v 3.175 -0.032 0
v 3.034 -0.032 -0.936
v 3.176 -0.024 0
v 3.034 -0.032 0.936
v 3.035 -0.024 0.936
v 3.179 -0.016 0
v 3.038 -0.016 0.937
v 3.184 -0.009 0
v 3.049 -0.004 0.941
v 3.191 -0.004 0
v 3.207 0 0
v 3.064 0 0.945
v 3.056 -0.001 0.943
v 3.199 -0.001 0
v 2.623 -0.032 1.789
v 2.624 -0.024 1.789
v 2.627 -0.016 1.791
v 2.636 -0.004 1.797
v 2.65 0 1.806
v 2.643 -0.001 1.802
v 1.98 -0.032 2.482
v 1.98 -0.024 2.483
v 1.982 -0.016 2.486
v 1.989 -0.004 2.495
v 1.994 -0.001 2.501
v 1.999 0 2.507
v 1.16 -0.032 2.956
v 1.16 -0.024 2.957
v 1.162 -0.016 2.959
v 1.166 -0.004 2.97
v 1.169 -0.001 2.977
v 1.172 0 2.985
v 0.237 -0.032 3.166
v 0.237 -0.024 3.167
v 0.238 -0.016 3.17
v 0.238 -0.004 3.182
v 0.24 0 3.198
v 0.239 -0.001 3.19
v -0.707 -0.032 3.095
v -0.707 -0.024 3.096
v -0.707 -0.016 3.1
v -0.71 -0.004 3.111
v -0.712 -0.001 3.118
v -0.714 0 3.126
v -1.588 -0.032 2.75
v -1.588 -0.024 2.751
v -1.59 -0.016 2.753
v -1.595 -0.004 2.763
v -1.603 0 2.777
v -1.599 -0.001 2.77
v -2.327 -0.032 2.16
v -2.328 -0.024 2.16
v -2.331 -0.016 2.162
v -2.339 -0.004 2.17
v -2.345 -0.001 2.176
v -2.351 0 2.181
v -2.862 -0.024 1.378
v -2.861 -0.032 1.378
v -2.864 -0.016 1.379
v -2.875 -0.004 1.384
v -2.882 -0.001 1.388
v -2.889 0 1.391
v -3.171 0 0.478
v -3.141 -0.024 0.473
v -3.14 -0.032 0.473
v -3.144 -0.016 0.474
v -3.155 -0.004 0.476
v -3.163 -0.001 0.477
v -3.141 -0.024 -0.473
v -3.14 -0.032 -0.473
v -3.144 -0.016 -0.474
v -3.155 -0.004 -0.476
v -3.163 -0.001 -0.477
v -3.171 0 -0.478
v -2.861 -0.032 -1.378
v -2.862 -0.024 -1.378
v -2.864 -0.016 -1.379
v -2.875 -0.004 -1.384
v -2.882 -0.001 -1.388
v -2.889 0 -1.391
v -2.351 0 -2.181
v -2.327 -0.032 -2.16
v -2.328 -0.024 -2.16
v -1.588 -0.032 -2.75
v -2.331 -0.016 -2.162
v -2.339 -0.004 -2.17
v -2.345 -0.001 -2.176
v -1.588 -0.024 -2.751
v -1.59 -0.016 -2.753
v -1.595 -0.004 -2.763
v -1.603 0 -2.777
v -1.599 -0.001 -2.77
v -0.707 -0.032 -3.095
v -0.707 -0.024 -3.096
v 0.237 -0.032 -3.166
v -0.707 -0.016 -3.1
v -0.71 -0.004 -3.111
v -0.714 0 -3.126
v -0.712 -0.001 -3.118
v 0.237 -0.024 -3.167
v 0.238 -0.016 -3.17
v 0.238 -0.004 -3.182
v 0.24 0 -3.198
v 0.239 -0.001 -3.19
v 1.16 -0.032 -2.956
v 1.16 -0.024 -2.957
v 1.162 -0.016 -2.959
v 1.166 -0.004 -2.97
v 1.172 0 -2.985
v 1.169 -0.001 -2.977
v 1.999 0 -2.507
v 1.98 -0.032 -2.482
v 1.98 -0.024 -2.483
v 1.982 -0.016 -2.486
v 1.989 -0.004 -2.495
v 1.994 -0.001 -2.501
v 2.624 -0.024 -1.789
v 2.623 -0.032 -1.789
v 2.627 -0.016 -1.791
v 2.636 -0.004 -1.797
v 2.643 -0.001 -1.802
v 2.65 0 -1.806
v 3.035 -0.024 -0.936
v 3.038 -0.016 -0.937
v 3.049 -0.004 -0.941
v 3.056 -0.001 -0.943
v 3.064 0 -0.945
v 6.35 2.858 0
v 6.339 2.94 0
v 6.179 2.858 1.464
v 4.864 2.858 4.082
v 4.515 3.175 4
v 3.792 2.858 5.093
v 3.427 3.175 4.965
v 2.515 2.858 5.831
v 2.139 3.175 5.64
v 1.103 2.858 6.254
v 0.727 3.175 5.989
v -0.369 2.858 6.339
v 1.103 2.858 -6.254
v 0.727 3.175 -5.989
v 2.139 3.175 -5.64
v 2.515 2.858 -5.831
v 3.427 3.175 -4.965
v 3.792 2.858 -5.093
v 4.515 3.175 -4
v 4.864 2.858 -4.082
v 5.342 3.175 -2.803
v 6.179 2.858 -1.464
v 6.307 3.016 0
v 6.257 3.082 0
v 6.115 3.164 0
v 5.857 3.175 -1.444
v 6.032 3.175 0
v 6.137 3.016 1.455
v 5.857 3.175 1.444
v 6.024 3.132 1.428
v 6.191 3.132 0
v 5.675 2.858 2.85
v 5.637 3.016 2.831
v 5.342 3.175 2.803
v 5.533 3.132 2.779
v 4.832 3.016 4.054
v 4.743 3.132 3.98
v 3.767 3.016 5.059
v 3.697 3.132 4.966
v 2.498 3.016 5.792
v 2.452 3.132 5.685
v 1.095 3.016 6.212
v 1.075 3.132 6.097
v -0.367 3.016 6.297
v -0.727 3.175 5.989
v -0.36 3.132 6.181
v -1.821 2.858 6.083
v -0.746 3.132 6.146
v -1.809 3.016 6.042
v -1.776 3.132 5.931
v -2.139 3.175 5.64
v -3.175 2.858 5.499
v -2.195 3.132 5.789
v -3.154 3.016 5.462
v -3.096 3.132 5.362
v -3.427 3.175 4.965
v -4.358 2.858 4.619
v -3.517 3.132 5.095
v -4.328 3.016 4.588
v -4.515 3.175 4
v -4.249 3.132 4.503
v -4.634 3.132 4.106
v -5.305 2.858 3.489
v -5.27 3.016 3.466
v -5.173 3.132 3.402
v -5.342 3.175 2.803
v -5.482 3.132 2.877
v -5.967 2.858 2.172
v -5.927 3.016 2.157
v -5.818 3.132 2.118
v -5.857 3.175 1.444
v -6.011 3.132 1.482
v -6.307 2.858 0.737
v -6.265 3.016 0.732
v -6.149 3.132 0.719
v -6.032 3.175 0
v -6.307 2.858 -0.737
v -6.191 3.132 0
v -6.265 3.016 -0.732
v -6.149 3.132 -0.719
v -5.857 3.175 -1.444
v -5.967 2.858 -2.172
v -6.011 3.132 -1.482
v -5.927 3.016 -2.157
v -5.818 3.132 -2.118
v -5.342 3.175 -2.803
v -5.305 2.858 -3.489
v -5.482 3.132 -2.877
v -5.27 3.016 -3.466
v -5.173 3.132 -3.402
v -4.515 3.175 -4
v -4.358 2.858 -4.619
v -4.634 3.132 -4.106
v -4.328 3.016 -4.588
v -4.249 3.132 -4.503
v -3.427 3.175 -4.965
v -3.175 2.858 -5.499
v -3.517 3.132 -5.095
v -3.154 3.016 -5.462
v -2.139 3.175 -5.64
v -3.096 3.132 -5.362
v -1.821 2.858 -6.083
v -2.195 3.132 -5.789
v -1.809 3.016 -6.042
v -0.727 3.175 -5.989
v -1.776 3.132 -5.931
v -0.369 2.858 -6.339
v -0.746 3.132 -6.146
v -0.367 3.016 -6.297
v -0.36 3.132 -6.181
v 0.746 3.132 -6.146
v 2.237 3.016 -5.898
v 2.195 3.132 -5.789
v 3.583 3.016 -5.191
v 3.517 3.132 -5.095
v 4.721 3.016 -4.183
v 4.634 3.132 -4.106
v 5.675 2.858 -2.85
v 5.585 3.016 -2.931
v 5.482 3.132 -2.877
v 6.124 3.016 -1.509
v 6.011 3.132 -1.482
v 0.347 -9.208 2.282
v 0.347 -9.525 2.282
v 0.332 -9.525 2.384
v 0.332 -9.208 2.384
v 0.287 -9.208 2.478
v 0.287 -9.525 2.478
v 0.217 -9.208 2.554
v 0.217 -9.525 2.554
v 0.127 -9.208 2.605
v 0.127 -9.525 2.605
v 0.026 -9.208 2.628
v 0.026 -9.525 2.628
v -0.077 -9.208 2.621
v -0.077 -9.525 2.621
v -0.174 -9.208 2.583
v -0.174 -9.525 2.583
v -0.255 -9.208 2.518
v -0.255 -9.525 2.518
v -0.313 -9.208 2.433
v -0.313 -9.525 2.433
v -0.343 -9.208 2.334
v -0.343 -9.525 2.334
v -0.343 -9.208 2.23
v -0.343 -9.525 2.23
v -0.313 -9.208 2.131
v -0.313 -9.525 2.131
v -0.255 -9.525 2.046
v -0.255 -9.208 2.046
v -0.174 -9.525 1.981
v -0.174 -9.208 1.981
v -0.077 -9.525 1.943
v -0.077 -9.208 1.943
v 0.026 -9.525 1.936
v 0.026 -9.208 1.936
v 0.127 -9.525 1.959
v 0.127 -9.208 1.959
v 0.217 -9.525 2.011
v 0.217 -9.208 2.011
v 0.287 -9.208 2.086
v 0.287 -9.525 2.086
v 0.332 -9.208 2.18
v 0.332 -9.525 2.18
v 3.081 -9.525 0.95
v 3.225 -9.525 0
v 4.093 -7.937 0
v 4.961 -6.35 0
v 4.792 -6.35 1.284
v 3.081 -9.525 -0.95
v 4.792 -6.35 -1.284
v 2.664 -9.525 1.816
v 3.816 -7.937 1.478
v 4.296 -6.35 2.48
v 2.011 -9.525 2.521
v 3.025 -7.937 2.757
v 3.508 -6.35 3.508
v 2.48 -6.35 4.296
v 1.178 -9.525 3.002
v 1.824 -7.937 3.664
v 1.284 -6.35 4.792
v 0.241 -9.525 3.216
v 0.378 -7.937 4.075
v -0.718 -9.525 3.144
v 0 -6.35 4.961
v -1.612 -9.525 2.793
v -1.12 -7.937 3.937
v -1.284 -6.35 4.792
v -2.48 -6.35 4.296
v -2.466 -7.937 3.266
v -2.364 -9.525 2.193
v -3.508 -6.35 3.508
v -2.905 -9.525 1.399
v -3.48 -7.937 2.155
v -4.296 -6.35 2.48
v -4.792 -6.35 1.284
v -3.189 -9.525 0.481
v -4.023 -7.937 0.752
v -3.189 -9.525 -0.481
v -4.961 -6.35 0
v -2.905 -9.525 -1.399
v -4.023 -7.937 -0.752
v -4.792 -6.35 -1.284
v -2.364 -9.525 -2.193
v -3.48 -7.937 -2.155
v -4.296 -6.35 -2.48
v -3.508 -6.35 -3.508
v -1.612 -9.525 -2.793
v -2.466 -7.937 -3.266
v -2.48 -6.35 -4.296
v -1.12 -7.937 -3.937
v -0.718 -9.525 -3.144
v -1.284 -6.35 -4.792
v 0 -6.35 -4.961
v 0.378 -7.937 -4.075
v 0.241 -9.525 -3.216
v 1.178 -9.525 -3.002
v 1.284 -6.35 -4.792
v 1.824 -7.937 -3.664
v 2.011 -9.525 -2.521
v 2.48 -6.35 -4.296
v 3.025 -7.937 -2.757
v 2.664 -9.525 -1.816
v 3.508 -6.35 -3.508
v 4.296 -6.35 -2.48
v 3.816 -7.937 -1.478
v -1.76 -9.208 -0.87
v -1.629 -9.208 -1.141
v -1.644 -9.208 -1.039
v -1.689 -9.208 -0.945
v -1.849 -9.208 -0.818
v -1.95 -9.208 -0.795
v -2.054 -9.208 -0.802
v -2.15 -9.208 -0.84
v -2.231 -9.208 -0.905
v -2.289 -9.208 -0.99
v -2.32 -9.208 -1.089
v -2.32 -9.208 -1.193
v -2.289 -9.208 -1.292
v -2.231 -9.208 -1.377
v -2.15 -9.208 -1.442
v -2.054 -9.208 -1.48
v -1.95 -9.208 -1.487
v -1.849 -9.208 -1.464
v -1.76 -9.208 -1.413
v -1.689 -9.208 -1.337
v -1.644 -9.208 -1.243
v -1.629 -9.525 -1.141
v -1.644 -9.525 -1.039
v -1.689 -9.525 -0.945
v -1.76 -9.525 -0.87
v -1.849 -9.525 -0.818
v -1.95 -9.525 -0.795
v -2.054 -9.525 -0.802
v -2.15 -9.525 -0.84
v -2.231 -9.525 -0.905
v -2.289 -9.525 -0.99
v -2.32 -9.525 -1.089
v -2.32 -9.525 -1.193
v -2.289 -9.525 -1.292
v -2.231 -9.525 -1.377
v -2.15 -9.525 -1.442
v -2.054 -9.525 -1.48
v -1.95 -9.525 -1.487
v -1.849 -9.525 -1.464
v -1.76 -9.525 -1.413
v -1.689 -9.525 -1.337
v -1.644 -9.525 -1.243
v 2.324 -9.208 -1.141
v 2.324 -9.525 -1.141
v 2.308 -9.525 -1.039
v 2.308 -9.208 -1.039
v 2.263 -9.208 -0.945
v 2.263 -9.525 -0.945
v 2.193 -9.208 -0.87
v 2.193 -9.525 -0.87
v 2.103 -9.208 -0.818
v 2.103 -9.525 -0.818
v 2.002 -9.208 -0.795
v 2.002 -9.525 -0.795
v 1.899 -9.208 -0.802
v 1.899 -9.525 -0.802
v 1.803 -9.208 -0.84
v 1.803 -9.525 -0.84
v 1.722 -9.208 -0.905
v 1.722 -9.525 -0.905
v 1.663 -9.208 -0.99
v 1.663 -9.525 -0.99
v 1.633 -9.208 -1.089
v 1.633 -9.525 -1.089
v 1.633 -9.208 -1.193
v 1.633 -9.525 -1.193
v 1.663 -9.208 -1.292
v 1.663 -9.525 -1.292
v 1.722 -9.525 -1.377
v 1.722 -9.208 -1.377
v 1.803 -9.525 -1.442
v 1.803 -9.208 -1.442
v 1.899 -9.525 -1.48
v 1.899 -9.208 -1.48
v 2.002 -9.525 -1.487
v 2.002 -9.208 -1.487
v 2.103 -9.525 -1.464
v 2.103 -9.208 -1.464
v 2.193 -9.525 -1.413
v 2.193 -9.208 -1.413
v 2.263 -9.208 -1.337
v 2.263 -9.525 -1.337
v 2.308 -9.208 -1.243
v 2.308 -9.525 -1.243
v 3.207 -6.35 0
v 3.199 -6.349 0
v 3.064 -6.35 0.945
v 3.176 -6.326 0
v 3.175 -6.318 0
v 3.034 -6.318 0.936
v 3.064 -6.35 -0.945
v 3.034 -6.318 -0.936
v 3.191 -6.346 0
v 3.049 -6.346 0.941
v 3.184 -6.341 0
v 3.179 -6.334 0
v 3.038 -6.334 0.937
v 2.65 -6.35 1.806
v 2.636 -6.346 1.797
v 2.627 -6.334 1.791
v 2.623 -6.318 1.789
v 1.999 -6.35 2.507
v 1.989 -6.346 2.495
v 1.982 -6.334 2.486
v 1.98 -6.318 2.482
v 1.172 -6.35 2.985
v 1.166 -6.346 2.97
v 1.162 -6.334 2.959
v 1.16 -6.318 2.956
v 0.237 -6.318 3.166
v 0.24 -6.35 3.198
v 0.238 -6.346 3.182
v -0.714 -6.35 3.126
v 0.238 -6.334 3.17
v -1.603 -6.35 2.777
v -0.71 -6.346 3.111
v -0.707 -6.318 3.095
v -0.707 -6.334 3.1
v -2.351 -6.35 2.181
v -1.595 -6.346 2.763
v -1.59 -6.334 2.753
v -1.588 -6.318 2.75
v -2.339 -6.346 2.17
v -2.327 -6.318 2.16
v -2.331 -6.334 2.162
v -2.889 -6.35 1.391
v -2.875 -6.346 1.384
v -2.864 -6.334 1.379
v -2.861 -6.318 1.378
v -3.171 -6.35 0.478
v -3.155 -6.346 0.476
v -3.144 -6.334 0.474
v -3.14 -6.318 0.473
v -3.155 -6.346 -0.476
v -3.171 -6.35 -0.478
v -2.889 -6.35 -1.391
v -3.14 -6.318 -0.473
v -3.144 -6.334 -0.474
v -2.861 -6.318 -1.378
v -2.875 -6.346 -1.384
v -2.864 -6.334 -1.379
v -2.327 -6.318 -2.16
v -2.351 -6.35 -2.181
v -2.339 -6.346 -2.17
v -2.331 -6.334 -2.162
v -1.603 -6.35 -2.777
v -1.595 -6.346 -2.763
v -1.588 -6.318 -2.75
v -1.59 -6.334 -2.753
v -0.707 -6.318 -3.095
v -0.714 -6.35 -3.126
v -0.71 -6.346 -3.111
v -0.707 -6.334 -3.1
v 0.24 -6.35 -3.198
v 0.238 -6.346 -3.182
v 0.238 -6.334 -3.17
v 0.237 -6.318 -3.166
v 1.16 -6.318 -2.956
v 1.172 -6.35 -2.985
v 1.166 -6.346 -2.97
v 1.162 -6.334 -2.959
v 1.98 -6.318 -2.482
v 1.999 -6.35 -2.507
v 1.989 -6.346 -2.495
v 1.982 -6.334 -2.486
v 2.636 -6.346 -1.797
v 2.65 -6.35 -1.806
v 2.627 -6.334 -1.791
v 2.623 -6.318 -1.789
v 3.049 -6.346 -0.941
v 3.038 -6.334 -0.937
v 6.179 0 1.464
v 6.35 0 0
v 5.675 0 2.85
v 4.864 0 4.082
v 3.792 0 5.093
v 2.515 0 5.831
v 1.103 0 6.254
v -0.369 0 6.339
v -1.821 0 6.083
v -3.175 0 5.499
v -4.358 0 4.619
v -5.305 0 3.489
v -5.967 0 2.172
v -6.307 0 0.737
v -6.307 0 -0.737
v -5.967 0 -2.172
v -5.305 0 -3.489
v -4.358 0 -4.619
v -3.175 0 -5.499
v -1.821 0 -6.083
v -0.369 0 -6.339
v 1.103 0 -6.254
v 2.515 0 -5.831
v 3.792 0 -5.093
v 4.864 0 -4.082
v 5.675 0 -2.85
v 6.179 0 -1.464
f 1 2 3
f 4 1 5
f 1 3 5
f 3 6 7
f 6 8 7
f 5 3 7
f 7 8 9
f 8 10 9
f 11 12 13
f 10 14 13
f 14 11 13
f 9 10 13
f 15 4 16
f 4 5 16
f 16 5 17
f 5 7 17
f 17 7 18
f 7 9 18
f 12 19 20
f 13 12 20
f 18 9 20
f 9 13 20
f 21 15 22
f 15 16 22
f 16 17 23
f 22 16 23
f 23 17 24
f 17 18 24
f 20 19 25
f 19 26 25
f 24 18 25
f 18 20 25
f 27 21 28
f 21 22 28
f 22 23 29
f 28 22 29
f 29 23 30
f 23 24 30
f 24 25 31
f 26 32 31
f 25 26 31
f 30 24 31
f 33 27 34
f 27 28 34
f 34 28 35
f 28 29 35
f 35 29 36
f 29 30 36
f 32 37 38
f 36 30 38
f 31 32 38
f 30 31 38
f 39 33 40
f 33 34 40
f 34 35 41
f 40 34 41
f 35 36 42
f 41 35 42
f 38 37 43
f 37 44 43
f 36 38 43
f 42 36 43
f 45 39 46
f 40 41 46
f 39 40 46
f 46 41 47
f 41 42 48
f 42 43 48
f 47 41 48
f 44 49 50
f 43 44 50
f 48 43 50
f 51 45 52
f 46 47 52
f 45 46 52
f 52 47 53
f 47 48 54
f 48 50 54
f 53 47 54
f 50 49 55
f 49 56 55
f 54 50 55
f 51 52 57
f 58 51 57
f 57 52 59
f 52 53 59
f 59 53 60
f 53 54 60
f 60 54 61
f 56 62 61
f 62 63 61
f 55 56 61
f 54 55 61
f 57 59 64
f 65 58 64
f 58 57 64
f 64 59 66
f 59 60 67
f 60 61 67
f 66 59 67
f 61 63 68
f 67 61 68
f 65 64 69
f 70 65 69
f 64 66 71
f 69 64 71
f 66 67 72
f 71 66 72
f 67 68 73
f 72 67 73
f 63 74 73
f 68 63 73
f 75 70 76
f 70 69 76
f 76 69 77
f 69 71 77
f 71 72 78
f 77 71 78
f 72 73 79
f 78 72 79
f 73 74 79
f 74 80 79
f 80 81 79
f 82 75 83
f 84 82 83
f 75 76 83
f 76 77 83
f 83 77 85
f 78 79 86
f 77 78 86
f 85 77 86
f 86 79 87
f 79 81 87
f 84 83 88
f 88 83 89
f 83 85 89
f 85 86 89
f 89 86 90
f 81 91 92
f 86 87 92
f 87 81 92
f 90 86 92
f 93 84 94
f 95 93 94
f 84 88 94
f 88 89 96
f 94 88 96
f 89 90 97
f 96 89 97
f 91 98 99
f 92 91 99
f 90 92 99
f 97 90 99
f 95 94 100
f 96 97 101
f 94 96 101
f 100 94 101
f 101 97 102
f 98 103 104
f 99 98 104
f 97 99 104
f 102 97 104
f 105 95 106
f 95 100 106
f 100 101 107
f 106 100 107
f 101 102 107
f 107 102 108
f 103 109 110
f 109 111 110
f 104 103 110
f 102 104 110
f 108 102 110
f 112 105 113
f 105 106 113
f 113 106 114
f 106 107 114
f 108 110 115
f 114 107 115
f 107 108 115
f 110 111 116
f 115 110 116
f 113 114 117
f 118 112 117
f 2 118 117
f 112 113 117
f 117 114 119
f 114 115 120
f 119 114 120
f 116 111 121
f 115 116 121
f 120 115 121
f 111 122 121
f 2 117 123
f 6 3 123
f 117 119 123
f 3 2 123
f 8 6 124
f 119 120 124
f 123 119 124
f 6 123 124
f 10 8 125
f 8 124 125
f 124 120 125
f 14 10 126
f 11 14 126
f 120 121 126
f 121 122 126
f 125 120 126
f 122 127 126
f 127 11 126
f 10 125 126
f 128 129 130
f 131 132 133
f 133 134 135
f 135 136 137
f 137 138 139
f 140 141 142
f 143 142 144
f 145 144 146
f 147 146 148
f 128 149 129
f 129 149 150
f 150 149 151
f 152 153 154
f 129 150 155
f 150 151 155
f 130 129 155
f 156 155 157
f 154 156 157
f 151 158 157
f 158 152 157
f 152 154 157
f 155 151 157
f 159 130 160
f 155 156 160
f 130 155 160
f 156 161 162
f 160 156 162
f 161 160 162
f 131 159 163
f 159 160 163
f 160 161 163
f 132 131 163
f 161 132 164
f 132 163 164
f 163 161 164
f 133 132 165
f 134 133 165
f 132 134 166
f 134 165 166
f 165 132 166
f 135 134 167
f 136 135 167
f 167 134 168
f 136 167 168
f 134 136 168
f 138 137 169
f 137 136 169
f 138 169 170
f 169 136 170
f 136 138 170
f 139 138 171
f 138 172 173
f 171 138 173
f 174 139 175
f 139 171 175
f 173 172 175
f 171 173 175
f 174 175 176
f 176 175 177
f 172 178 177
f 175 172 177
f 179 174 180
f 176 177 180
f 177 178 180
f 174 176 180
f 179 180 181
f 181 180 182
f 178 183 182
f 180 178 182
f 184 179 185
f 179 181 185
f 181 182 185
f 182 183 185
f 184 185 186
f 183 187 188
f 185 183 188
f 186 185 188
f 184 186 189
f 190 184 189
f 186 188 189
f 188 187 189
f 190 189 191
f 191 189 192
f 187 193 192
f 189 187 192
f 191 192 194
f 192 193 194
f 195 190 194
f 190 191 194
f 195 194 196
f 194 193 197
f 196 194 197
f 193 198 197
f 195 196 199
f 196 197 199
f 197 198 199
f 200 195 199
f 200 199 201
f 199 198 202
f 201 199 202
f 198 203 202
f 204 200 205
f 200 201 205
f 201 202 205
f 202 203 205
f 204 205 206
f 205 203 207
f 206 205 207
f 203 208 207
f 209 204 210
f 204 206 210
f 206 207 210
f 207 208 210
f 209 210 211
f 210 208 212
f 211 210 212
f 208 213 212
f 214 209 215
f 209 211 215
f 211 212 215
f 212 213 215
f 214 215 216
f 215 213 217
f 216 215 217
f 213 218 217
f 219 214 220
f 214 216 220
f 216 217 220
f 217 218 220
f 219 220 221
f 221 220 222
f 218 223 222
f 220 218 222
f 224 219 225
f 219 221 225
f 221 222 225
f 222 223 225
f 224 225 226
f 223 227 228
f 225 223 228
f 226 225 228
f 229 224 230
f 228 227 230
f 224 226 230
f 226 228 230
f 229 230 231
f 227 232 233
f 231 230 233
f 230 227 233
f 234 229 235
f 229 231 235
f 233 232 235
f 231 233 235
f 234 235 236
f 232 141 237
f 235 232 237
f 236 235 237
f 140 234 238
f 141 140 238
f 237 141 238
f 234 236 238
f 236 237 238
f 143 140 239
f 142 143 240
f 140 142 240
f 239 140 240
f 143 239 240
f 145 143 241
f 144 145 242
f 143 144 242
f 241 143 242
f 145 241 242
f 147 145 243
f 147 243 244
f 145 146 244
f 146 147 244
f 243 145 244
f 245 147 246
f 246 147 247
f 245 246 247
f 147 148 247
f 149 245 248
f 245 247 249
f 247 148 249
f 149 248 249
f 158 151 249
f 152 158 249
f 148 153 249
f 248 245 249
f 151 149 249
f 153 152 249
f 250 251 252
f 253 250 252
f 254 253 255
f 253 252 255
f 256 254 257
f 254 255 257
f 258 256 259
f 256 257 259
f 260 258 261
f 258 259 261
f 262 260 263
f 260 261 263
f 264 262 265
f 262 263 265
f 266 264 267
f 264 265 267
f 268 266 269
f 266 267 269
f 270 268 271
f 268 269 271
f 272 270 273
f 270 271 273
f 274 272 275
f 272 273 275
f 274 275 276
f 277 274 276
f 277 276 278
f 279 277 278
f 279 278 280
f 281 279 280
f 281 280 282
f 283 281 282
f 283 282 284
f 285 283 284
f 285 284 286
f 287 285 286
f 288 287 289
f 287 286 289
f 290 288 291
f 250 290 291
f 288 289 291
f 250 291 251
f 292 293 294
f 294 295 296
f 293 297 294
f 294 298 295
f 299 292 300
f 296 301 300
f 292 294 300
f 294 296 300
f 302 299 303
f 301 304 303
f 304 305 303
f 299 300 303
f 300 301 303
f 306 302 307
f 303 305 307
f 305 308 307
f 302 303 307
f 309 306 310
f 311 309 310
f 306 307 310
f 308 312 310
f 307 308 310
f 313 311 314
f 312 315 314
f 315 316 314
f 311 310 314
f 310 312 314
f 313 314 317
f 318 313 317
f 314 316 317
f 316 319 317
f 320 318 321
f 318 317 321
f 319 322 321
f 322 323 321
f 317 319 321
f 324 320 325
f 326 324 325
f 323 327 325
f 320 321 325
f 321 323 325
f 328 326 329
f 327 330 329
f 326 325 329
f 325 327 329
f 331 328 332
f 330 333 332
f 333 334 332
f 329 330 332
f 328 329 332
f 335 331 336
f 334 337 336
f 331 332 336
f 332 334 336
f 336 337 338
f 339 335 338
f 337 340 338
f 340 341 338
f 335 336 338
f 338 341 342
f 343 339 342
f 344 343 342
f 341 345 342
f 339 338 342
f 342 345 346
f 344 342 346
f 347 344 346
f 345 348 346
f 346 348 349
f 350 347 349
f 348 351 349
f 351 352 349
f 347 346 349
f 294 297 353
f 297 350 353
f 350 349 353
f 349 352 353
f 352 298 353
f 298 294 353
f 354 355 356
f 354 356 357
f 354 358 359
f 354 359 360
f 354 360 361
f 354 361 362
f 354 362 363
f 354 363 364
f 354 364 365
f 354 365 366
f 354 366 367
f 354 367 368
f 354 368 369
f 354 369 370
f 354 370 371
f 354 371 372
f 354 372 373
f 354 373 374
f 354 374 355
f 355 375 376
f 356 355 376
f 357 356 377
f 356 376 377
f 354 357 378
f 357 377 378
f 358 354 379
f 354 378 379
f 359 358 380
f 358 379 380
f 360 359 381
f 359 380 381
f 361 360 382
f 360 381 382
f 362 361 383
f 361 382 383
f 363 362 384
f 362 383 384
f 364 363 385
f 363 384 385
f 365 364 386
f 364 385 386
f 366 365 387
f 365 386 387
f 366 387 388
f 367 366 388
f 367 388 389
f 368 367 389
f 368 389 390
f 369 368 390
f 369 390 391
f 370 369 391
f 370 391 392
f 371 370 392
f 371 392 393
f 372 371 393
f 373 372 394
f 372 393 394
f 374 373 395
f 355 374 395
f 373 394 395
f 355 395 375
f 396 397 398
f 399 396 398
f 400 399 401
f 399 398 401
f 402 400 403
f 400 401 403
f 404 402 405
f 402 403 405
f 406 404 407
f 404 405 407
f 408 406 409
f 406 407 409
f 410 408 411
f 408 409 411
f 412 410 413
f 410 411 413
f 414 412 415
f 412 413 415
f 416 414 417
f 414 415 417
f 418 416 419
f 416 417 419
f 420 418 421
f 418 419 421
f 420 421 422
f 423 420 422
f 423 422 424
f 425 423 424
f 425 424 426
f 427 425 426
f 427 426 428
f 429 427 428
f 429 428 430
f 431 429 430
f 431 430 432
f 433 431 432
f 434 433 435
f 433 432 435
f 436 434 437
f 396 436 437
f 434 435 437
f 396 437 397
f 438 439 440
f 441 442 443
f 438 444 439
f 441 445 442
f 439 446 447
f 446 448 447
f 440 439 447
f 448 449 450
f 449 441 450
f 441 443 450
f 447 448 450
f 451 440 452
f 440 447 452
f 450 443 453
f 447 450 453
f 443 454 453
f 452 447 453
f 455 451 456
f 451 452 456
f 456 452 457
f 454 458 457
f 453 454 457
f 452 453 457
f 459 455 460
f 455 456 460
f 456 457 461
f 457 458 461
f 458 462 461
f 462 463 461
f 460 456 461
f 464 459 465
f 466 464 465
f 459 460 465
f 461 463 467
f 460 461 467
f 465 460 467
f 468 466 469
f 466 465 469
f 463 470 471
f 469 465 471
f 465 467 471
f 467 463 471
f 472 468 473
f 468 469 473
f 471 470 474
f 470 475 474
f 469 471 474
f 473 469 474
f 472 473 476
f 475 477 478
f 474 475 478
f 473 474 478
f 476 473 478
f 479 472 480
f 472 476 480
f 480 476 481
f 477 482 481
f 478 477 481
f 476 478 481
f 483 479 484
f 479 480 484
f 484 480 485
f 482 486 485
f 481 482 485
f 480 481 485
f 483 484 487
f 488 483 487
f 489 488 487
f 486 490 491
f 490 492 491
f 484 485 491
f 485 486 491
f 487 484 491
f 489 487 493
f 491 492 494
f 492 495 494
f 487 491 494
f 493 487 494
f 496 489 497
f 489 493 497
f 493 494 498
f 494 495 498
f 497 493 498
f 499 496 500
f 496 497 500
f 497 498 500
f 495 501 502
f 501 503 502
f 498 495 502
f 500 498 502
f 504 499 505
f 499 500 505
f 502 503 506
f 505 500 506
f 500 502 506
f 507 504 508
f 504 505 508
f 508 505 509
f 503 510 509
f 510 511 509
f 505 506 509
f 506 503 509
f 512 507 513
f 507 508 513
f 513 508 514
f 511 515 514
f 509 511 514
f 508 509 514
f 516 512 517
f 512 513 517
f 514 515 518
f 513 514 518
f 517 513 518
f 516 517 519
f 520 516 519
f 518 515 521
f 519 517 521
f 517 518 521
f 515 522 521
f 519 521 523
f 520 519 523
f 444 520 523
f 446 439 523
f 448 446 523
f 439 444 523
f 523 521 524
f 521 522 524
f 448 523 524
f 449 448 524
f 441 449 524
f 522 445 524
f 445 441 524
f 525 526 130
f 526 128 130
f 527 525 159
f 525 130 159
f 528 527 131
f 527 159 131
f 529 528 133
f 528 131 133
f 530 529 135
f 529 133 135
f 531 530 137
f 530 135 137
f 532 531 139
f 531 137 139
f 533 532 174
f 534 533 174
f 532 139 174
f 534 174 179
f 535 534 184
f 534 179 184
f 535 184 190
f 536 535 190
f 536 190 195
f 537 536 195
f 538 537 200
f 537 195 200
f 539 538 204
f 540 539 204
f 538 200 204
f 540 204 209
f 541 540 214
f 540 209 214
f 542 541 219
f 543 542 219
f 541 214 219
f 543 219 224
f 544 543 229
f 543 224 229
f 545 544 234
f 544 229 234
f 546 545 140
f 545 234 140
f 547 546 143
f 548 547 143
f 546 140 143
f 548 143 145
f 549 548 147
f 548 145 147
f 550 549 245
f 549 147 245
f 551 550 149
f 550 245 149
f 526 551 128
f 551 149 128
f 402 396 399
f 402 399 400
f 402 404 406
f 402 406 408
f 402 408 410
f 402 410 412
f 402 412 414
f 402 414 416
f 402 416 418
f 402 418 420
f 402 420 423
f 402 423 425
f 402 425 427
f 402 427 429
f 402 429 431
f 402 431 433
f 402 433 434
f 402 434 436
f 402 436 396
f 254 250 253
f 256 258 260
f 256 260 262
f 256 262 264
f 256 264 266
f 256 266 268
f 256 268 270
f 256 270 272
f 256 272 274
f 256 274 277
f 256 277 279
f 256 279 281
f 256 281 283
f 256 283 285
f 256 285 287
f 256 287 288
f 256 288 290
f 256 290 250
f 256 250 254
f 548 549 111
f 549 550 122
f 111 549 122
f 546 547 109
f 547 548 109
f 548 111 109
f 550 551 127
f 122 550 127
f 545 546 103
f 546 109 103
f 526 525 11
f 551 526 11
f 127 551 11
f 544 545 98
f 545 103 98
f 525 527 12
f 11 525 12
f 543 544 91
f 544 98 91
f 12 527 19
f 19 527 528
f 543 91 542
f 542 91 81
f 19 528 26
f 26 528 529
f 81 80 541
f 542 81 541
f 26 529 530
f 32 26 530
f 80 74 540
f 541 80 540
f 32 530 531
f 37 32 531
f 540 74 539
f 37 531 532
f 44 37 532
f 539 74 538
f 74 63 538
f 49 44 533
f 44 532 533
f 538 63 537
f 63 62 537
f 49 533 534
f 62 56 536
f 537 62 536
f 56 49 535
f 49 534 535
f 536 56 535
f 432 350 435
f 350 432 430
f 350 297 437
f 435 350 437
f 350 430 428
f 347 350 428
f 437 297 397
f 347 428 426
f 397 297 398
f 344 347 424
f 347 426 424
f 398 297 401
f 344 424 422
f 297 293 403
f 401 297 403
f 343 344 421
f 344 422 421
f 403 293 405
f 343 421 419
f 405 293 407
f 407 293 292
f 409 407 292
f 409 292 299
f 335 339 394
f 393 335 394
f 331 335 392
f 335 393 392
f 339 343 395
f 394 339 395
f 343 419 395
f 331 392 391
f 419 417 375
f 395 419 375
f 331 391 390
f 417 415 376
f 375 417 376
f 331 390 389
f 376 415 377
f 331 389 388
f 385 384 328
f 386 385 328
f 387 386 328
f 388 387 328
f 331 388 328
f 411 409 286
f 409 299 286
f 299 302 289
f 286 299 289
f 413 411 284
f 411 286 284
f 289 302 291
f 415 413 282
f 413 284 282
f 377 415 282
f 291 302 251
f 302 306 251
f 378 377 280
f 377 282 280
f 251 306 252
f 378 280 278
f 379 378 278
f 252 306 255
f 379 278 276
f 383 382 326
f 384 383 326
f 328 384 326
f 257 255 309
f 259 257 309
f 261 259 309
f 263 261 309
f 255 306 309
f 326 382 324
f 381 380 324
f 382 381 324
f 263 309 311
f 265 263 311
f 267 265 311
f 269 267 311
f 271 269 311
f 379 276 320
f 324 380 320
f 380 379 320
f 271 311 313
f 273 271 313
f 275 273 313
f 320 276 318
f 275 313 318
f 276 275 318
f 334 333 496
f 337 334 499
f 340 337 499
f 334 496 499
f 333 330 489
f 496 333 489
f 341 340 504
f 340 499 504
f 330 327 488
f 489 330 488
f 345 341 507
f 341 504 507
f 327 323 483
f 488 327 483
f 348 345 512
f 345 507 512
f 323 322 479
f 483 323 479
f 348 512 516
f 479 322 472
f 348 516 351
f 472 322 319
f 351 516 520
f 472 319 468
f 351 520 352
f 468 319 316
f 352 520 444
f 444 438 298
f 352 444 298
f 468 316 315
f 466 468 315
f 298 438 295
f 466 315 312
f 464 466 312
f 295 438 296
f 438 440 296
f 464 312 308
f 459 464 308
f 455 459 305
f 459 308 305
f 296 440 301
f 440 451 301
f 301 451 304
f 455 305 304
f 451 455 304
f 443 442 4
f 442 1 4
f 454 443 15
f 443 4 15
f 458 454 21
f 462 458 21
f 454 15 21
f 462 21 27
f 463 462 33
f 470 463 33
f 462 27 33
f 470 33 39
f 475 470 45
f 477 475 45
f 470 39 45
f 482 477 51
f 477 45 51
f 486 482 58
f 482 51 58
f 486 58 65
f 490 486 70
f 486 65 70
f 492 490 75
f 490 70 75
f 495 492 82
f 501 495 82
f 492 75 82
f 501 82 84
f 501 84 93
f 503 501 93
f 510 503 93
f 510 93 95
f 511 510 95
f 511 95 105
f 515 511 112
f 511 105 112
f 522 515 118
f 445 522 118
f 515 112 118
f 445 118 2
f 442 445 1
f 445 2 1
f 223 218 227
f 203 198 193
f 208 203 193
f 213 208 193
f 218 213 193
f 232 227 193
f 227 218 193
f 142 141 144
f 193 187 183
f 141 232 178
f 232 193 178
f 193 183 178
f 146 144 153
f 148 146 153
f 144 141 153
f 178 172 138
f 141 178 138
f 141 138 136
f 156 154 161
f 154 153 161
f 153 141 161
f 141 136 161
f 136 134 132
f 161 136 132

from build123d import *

# Parameters (mm, degrees)
SKETCH3_R          = 0.347265625
CUT_EXTRUDE1_DEPTH = 0.3175


with BuildPart() as part:
    # Sketch2 → Revolve1 (revolve)
    with BuildSketch(Plane.XY):
        with BuildLine():
            Line((0, 3.175), (0, -9.525))
            Line((0, -9.525), (3.224609375, -9.525))
            Line((3.224609375, -9.525), (4.9609375, -6.35))
            Line((4.9609375, -6.35), (3.20675, -6.35))
            ThreePointArc((3.20675, -6.35), (3.18429936, -6.34070064), (3.175, -6.31825))
            Line((3.175, -6.31825), (3.175, -0.03175))
            ThreePointArc((3.175, -0.03175), (3.18429936, -0.00929936), (3.20675, 0))
            Line((3.20675, 0), (6.35, 0))
            Line((6.35, 0), (6.35, 2.8575))
            ThreePointArc((6.35, 2.8575), (6.257006403, 3.082006403), (6.0325, 3.175))
            Line((6.0325, 3.175), (0, 3.175))
        make_face()
    revolve(axis=Axis((0, 3.175, 0), (0, -1, 0)))

    # Sketch3 → Cut-Extrude1 (cut)
    with BuildSketch(Plane.XZ.offset(9.525)):
        with Locations((0, 2.28203125)):
            Circle(SKETCH3_R)
        with Locations((1.976297035, -1.141015625)):
            Circle(SKETCH3_R)
        with Locations((-1.976297035, -1.141015625)):
            Circle(SKETCH3_R)
    extrude(amount=-CUT_EXTRUDE1_DEPTH, mode=Mode.SUBTRACT)


solid = part.part
